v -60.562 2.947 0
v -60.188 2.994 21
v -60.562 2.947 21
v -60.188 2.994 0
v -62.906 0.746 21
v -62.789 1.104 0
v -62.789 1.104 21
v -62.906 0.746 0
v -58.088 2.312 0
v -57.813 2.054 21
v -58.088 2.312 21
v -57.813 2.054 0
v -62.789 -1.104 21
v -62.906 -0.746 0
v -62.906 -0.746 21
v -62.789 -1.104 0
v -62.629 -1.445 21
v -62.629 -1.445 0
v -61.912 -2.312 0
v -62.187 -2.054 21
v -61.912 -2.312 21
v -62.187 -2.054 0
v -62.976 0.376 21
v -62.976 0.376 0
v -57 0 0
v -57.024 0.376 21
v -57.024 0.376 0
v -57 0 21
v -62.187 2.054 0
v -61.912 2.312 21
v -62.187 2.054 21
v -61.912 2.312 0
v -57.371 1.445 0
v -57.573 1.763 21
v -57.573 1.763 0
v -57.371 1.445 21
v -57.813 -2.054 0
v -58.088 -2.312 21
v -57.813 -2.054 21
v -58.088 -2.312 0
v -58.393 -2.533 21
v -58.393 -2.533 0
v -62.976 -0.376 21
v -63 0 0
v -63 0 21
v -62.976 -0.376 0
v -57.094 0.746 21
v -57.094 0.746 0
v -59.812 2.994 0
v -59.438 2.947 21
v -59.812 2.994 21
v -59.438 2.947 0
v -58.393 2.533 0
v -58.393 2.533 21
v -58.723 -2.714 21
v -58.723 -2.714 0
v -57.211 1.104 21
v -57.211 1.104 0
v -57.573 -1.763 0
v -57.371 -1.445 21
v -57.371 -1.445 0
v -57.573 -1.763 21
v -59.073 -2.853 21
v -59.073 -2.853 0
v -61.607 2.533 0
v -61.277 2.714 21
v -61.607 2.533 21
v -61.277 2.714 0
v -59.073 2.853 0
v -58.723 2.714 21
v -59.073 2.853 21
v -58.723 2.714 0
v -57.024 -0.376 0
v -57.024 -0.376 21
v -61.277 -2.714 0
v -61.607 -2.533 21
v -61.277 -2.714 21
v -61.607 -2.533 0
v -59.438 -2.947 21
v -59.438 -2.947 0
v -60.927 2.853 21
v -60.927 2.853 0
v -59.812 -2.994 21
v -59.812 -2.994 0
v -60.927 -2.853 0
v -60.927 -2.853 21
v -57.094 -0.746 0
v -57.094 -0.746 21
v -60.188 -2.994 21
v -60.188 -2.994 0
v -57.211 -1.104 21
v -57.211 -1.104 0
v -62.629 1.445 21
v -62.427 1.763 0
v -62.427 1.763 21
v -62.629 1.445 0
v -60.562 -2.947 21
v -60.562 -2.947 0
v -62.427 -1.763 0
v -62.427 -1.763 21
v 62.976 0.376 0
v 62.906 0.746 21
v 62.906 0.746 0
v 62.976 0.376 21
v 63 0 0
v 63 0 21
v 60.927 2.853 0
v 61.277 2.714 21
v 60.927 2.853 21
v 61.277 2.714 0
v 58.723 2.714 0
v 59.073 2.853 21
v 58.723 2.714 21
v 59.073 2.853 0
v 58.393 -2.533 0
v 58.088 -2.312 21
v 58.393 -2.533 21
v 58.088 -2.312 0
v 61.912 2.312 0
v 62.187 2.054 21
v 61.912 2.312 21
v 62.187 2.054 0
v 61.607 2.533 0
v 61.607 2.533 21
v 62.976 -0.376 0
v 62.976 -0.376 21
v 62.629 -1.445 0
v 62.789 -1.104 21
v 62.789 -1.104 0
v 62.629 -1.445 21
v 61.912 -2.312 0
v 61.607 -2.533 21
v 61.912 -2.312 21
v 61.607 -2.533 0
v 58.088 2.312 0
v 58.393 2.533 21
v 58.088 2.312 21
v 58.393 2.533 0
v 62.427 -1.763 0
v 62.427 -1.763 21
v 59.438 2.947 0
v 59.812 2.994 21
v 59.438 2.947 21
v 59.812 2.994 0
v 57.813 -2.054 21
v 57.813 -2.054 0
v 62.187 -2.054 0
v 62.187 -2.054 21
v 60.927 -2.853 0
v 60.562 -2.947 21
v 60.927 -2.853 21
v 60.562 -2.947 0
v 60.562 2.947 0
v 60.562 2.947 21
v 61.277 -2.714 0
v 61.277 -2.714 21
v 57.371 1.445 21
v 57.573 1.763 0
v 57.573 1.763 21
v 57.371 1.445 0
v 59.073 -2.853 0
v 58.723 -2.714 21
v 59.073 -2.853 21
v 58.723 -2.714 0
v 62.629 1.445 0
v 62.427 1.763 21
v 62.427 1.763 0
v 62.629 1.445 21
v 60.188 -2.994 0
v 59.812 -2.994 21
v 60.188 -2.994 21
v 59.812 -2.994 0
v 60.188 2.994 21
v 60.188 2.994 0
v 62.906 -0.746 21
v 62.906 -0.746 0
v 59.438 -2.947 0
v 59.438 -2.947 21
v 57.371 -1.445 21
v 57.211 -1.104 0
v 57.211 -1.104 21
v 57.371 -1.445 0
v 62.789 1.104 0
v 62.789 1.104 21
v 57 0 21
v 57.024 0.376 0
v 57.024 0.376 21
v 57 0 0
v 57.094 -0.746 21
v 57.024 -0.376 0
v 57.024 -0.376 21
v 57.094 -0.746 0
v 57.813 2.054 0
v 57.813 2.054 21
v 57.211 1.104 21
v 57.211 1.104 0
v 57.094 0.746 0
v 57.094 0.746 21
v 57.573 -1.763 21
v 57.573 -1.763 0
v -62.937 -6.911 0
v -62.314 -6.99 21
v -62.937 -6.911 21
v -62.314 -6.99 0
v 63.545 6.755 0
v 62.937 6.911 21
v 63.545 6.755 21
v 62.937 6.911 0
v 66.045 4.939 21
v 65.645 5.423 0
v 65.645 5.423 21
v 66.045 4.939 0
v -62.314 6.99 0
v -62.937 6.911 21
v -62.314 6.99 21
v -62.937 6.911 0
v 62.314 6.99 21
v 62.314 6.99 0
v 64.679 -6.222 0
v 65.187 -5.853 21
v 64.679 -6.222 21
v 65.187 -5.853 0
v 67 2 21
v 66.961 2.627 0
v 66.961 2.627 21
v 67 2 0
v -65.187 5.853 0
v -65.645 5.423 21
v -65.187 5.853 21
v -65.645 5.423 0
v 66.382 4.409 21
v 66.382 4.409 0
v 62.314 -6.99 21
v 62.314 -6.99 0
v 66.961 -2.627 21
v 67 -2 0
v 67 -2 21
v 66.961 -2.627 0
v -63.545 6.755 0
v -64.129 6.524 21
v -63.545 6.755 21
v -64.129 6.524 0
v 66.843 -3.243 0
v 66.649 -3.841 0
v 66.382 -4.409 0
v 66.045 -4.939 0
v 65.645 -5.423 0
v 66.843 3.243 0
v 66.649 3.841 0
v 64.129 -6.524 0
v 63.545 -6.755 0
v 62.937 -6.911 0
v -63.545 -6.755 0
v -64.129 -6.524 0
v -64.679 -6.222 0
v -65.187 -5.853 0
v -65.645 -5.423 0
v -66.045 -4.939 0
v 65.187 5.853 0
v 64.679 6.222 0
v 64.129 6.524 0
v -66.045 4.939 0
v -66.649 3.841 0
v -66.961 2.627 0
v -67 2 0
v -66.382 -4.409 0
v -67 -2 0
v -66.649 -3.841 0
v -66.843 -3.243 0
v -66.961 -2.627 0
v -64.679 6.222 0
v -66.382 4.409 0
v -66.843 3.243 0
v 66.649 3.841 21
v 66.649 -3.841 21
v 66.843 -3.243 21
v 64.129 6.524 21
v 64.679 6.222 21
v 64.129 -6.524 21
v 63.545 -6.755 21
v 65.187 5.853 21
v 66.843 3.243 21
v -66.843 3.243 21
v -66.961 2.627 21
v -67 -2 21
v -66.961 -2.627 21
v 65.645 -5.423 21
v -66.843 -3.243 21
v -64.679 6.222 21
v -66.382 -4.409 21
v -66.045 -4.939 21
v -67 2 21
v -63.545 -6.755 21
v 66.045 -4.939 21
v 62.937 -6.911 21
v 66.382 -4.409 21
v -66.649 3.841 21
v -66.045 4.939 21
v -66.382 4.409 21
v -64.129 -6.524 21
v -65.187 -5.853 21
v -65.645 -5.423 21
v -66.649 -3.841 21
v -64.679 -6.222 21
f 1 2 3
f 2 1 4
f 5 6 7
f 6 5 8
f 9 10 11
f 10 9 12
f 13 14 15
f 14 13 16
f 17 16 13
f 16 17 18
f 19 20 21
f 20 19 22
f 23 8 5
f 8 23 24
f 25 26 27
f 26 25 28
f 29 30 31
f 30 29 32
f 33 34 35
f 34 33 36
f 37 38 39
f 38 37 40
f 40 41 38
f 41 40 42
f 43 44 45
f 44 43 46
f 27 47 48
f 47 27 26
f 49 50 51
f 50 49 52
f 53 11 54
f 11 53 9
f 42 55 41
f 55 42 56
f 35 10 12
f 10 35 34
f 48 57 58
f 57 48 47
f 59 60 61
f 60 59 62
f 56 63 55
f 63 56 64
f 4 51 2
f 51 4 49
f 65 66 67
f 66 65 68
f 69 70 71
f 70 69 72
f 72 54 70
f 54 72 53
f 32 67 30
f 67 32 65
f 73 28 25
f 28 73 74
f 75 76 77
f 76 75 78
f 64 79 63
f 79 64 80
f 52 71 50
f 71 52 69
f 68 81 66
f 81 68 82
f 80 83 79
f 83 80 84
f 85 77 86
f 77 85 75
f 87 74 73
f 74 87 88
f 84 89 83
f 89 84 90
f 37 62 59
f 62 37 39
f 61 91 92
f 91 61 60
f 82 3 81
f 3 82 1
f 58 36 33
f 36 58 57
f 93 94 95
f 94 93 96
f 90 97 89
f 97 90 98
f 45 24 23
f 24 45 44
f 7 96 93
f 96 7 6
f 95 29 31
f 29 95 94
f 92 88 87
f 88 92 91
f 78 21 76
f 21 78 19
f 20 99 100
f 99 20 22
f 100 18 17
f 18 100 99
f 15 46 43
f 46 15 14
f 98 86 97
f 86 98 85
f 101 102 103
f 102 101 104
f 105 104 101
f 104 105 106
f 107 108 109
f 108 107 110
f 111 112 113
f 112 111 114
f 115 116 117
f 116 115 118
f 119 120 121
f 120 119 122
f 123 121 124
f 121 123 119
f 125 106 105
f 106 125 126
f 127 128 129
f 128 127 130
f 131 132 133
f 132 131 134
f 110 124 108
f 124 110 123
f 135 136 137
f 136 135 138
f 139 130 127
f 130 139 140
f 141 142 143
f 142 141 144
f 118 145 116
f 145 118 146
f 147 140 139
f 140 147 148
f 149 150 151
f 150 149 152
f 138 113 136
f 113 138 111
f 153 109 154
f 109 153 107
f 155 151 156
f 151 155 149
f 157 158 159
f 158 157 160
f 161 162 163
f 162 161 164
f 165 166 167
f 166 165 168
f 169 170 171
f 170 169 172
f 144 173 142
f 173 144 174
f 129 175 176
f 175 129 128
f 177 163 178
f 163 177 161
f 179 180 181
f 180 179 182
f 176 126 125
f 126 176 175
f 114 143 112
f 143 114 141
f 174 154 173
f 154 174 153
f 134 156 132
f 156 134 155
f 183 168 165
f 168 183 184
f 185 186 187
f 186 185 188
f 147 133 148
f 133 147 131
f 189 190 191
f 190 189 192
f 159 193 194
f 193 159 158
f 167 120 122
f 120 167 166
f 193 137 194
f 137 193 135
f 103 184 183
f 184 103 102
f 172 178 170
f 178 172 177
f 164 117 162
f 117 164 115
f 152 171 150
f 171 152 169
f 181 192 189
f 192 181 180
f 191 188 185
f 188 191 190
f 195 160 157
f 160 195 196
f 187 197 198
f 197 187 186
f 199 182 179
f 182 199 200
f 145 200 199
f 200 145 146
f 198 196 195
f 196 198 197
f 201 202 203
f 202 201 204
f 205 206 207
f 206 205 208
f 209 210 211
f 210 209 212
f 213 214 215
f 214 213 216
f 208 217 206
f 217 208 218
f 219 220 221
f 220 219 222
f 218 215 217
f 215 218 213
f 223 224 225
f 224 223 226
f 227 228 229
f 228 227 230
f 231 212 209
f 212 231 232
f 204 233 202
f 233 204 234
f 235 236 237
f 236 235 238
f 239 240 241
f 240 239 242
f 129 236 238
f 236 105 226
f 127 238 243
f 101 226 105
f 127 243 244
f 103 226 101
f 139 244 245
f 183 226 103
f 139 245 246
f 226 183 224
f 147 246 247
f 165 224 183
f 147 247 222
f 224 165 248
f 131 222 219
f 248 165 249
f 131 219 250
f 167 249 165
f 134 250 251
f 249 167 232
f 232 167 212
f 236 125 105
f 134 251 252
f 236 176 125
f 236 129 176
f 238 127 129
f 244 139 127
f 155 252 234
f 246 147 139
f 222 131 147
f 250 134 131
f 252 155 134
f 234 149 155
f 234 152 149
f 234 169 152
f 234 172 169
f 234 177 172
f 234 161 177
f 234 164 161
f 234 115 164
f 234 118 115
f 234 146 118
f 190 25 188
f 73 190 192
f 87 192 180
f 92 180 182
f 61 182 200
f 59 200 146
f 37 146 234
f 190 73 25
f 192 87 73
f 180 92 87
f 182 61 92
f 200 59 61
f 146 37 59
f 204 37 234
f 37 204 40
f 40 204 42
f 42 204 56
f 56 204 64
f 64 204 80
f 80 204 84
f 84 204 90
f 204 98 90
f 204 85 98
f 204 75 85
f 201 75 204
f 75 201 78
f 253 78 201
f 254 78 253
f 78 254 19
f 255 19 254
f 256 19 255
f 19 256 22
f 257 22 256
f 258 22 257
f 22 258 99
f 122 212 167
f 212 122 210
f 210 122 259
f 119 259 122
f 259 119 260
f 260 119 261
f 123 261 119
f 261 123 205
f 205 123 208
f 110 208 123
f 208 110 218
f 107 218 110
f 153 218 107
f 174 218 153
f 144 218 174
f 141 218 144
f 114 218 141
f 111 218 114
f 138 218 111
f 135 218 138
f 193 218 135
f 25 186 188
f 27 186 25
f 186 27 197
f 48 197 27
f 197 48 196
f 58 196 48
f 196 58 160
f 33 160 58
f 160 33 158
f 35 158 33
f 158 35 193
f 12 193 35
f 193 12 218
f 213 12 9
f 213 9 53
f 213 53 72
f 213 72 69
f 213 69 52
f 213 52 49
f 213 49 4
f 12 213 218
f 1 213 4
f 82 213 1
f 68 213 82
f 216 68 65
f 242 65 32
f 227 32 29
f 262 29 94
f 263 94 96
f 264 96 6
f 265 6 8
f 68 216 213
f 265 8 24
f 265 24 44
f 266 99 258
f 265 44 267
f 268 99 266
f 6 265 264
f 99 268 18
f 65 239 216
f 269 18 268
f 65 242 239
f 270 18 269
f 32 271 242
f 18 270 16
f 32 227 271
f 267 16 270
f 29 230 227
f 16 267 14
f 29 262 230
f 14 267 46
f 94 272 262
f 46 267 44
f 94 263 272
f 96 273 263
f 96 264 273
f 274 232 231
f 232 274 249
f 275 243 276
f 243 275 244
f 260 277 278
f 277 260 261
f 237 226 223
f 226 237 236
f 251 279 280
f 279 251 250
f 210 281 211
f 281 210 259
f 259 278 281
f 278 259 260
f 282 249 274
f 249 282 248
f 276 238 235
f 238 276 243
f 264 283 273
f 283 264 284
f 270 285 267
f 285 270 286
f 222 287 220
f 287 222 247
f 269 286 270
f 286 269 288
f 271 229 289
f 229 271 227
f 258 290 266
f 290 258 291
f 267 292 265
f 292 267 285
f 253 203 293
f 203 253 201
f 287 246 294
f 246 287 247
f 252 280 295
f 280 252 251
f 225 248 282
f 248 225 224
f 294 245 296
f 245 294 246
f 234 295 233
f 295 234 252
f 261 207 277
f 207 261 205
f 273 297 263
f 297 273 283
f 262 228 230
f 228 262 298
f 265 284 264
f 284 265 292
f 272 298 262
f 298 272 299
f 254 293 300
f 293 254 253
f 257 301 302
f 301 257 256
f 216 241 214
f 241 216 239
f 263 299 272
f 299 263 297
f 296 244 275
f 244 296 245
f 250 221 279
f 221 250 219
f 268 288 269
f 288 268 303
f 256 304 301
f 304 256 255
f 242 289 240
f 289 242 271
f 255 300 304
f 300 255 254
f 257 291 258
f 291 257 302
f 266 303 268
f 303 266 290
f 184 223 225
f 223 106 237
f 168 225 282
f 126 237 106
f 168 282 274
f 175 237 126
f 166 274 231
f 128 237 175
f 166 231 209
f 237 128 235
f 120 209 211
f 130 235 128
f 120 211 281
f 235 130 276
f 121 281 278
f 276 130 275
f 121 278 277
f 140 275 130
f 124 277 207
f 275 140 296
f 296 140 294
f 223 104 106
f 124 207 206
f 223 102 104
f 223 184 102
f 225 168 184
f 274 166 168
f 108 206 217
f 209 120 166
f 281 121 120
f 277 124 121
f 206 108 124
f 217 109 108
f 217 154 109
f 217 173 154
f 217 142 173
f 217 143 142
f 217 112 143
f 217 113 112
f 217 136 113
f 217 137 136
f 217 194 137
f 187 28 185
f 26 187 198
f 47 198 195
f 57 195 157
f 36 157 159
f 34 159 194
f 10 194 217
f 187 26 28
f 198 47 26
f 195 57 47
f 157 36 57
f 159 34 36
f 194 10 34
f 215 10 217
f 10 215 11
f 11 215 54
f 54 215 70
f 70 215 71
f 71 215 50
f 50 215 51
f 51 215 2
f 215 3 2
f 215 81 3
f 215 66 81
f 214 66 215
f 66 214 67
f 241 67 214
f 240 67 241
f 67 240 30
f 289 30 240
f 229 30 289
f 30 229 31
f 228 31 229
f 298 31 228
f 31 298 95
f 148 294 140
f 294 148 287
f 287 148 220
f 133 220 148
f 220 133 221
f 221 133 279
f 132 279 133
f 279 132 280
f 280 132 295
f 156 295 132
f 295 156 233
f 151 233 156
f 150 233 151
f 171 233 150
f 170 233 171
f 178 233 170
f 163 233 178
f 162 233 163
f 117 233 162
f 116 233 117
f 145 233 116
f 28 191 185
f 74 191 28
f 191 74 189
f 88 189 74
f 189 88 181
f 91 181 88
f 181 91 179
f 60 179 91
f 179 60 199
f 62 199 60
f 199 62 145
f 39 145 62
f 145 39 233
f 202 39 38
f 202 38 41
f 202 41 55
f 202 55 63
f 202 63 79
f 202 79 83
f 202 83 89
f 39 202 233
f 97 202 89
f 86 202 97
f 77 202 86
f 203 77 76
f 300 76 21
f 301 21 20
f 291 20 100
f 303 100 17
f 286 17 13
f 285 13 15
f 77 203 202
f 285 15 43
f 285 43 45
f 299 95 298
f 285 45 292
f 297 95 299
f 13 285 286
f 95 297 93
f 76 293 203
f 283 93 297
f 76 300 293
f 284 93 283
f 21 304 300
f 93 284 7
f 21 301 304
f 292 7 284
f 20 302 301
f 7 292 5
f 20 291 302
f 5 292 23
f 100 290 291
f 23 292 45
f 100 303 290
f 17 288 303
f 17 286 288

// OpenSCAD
$fn = 50;


difference() {
	union() {
		hull() {
			translate(v = [-62.0000000000, 2.0000000000, 0]) {
				cylinder(h = 21, r = 5);
			}
			translate(v = [62.0000000000, 2.0000000000, 0]) {
				cylinder(h = 21, r = 5);
			}
			translate(v = [-62.0000000000, -2.0000000000, 0]) {
				cylinder(h = 21, r = 5);
			}
			translate(v = [62.0000000000, -2.0000000000, 0]) {
				cylinder(h = 21, r = 5);
			}
		}
	}
	union() {
		translate(v = [-60.0000000000, 0.0000000000, -100.0000000000]) {
			cylinder(h = 200, r = 3.0000000000);
		}
		translate(v = [-60.0000000000, 0.0000000000, -100.0000000000]) {
			cylinder(h = 200, r = 3.0000000000);
		}
		translate(v = [60.0000000000, 0.0000000000, -100.0000000000]) {
			cylinder(h = 200, r = 3.0000000000);
		}
		translate(v = [60.0000000000, 0.0000000000, -100.0000000000]) {
			cylinder(h = 200, r = 3.0000000000);
		}
	}
}
